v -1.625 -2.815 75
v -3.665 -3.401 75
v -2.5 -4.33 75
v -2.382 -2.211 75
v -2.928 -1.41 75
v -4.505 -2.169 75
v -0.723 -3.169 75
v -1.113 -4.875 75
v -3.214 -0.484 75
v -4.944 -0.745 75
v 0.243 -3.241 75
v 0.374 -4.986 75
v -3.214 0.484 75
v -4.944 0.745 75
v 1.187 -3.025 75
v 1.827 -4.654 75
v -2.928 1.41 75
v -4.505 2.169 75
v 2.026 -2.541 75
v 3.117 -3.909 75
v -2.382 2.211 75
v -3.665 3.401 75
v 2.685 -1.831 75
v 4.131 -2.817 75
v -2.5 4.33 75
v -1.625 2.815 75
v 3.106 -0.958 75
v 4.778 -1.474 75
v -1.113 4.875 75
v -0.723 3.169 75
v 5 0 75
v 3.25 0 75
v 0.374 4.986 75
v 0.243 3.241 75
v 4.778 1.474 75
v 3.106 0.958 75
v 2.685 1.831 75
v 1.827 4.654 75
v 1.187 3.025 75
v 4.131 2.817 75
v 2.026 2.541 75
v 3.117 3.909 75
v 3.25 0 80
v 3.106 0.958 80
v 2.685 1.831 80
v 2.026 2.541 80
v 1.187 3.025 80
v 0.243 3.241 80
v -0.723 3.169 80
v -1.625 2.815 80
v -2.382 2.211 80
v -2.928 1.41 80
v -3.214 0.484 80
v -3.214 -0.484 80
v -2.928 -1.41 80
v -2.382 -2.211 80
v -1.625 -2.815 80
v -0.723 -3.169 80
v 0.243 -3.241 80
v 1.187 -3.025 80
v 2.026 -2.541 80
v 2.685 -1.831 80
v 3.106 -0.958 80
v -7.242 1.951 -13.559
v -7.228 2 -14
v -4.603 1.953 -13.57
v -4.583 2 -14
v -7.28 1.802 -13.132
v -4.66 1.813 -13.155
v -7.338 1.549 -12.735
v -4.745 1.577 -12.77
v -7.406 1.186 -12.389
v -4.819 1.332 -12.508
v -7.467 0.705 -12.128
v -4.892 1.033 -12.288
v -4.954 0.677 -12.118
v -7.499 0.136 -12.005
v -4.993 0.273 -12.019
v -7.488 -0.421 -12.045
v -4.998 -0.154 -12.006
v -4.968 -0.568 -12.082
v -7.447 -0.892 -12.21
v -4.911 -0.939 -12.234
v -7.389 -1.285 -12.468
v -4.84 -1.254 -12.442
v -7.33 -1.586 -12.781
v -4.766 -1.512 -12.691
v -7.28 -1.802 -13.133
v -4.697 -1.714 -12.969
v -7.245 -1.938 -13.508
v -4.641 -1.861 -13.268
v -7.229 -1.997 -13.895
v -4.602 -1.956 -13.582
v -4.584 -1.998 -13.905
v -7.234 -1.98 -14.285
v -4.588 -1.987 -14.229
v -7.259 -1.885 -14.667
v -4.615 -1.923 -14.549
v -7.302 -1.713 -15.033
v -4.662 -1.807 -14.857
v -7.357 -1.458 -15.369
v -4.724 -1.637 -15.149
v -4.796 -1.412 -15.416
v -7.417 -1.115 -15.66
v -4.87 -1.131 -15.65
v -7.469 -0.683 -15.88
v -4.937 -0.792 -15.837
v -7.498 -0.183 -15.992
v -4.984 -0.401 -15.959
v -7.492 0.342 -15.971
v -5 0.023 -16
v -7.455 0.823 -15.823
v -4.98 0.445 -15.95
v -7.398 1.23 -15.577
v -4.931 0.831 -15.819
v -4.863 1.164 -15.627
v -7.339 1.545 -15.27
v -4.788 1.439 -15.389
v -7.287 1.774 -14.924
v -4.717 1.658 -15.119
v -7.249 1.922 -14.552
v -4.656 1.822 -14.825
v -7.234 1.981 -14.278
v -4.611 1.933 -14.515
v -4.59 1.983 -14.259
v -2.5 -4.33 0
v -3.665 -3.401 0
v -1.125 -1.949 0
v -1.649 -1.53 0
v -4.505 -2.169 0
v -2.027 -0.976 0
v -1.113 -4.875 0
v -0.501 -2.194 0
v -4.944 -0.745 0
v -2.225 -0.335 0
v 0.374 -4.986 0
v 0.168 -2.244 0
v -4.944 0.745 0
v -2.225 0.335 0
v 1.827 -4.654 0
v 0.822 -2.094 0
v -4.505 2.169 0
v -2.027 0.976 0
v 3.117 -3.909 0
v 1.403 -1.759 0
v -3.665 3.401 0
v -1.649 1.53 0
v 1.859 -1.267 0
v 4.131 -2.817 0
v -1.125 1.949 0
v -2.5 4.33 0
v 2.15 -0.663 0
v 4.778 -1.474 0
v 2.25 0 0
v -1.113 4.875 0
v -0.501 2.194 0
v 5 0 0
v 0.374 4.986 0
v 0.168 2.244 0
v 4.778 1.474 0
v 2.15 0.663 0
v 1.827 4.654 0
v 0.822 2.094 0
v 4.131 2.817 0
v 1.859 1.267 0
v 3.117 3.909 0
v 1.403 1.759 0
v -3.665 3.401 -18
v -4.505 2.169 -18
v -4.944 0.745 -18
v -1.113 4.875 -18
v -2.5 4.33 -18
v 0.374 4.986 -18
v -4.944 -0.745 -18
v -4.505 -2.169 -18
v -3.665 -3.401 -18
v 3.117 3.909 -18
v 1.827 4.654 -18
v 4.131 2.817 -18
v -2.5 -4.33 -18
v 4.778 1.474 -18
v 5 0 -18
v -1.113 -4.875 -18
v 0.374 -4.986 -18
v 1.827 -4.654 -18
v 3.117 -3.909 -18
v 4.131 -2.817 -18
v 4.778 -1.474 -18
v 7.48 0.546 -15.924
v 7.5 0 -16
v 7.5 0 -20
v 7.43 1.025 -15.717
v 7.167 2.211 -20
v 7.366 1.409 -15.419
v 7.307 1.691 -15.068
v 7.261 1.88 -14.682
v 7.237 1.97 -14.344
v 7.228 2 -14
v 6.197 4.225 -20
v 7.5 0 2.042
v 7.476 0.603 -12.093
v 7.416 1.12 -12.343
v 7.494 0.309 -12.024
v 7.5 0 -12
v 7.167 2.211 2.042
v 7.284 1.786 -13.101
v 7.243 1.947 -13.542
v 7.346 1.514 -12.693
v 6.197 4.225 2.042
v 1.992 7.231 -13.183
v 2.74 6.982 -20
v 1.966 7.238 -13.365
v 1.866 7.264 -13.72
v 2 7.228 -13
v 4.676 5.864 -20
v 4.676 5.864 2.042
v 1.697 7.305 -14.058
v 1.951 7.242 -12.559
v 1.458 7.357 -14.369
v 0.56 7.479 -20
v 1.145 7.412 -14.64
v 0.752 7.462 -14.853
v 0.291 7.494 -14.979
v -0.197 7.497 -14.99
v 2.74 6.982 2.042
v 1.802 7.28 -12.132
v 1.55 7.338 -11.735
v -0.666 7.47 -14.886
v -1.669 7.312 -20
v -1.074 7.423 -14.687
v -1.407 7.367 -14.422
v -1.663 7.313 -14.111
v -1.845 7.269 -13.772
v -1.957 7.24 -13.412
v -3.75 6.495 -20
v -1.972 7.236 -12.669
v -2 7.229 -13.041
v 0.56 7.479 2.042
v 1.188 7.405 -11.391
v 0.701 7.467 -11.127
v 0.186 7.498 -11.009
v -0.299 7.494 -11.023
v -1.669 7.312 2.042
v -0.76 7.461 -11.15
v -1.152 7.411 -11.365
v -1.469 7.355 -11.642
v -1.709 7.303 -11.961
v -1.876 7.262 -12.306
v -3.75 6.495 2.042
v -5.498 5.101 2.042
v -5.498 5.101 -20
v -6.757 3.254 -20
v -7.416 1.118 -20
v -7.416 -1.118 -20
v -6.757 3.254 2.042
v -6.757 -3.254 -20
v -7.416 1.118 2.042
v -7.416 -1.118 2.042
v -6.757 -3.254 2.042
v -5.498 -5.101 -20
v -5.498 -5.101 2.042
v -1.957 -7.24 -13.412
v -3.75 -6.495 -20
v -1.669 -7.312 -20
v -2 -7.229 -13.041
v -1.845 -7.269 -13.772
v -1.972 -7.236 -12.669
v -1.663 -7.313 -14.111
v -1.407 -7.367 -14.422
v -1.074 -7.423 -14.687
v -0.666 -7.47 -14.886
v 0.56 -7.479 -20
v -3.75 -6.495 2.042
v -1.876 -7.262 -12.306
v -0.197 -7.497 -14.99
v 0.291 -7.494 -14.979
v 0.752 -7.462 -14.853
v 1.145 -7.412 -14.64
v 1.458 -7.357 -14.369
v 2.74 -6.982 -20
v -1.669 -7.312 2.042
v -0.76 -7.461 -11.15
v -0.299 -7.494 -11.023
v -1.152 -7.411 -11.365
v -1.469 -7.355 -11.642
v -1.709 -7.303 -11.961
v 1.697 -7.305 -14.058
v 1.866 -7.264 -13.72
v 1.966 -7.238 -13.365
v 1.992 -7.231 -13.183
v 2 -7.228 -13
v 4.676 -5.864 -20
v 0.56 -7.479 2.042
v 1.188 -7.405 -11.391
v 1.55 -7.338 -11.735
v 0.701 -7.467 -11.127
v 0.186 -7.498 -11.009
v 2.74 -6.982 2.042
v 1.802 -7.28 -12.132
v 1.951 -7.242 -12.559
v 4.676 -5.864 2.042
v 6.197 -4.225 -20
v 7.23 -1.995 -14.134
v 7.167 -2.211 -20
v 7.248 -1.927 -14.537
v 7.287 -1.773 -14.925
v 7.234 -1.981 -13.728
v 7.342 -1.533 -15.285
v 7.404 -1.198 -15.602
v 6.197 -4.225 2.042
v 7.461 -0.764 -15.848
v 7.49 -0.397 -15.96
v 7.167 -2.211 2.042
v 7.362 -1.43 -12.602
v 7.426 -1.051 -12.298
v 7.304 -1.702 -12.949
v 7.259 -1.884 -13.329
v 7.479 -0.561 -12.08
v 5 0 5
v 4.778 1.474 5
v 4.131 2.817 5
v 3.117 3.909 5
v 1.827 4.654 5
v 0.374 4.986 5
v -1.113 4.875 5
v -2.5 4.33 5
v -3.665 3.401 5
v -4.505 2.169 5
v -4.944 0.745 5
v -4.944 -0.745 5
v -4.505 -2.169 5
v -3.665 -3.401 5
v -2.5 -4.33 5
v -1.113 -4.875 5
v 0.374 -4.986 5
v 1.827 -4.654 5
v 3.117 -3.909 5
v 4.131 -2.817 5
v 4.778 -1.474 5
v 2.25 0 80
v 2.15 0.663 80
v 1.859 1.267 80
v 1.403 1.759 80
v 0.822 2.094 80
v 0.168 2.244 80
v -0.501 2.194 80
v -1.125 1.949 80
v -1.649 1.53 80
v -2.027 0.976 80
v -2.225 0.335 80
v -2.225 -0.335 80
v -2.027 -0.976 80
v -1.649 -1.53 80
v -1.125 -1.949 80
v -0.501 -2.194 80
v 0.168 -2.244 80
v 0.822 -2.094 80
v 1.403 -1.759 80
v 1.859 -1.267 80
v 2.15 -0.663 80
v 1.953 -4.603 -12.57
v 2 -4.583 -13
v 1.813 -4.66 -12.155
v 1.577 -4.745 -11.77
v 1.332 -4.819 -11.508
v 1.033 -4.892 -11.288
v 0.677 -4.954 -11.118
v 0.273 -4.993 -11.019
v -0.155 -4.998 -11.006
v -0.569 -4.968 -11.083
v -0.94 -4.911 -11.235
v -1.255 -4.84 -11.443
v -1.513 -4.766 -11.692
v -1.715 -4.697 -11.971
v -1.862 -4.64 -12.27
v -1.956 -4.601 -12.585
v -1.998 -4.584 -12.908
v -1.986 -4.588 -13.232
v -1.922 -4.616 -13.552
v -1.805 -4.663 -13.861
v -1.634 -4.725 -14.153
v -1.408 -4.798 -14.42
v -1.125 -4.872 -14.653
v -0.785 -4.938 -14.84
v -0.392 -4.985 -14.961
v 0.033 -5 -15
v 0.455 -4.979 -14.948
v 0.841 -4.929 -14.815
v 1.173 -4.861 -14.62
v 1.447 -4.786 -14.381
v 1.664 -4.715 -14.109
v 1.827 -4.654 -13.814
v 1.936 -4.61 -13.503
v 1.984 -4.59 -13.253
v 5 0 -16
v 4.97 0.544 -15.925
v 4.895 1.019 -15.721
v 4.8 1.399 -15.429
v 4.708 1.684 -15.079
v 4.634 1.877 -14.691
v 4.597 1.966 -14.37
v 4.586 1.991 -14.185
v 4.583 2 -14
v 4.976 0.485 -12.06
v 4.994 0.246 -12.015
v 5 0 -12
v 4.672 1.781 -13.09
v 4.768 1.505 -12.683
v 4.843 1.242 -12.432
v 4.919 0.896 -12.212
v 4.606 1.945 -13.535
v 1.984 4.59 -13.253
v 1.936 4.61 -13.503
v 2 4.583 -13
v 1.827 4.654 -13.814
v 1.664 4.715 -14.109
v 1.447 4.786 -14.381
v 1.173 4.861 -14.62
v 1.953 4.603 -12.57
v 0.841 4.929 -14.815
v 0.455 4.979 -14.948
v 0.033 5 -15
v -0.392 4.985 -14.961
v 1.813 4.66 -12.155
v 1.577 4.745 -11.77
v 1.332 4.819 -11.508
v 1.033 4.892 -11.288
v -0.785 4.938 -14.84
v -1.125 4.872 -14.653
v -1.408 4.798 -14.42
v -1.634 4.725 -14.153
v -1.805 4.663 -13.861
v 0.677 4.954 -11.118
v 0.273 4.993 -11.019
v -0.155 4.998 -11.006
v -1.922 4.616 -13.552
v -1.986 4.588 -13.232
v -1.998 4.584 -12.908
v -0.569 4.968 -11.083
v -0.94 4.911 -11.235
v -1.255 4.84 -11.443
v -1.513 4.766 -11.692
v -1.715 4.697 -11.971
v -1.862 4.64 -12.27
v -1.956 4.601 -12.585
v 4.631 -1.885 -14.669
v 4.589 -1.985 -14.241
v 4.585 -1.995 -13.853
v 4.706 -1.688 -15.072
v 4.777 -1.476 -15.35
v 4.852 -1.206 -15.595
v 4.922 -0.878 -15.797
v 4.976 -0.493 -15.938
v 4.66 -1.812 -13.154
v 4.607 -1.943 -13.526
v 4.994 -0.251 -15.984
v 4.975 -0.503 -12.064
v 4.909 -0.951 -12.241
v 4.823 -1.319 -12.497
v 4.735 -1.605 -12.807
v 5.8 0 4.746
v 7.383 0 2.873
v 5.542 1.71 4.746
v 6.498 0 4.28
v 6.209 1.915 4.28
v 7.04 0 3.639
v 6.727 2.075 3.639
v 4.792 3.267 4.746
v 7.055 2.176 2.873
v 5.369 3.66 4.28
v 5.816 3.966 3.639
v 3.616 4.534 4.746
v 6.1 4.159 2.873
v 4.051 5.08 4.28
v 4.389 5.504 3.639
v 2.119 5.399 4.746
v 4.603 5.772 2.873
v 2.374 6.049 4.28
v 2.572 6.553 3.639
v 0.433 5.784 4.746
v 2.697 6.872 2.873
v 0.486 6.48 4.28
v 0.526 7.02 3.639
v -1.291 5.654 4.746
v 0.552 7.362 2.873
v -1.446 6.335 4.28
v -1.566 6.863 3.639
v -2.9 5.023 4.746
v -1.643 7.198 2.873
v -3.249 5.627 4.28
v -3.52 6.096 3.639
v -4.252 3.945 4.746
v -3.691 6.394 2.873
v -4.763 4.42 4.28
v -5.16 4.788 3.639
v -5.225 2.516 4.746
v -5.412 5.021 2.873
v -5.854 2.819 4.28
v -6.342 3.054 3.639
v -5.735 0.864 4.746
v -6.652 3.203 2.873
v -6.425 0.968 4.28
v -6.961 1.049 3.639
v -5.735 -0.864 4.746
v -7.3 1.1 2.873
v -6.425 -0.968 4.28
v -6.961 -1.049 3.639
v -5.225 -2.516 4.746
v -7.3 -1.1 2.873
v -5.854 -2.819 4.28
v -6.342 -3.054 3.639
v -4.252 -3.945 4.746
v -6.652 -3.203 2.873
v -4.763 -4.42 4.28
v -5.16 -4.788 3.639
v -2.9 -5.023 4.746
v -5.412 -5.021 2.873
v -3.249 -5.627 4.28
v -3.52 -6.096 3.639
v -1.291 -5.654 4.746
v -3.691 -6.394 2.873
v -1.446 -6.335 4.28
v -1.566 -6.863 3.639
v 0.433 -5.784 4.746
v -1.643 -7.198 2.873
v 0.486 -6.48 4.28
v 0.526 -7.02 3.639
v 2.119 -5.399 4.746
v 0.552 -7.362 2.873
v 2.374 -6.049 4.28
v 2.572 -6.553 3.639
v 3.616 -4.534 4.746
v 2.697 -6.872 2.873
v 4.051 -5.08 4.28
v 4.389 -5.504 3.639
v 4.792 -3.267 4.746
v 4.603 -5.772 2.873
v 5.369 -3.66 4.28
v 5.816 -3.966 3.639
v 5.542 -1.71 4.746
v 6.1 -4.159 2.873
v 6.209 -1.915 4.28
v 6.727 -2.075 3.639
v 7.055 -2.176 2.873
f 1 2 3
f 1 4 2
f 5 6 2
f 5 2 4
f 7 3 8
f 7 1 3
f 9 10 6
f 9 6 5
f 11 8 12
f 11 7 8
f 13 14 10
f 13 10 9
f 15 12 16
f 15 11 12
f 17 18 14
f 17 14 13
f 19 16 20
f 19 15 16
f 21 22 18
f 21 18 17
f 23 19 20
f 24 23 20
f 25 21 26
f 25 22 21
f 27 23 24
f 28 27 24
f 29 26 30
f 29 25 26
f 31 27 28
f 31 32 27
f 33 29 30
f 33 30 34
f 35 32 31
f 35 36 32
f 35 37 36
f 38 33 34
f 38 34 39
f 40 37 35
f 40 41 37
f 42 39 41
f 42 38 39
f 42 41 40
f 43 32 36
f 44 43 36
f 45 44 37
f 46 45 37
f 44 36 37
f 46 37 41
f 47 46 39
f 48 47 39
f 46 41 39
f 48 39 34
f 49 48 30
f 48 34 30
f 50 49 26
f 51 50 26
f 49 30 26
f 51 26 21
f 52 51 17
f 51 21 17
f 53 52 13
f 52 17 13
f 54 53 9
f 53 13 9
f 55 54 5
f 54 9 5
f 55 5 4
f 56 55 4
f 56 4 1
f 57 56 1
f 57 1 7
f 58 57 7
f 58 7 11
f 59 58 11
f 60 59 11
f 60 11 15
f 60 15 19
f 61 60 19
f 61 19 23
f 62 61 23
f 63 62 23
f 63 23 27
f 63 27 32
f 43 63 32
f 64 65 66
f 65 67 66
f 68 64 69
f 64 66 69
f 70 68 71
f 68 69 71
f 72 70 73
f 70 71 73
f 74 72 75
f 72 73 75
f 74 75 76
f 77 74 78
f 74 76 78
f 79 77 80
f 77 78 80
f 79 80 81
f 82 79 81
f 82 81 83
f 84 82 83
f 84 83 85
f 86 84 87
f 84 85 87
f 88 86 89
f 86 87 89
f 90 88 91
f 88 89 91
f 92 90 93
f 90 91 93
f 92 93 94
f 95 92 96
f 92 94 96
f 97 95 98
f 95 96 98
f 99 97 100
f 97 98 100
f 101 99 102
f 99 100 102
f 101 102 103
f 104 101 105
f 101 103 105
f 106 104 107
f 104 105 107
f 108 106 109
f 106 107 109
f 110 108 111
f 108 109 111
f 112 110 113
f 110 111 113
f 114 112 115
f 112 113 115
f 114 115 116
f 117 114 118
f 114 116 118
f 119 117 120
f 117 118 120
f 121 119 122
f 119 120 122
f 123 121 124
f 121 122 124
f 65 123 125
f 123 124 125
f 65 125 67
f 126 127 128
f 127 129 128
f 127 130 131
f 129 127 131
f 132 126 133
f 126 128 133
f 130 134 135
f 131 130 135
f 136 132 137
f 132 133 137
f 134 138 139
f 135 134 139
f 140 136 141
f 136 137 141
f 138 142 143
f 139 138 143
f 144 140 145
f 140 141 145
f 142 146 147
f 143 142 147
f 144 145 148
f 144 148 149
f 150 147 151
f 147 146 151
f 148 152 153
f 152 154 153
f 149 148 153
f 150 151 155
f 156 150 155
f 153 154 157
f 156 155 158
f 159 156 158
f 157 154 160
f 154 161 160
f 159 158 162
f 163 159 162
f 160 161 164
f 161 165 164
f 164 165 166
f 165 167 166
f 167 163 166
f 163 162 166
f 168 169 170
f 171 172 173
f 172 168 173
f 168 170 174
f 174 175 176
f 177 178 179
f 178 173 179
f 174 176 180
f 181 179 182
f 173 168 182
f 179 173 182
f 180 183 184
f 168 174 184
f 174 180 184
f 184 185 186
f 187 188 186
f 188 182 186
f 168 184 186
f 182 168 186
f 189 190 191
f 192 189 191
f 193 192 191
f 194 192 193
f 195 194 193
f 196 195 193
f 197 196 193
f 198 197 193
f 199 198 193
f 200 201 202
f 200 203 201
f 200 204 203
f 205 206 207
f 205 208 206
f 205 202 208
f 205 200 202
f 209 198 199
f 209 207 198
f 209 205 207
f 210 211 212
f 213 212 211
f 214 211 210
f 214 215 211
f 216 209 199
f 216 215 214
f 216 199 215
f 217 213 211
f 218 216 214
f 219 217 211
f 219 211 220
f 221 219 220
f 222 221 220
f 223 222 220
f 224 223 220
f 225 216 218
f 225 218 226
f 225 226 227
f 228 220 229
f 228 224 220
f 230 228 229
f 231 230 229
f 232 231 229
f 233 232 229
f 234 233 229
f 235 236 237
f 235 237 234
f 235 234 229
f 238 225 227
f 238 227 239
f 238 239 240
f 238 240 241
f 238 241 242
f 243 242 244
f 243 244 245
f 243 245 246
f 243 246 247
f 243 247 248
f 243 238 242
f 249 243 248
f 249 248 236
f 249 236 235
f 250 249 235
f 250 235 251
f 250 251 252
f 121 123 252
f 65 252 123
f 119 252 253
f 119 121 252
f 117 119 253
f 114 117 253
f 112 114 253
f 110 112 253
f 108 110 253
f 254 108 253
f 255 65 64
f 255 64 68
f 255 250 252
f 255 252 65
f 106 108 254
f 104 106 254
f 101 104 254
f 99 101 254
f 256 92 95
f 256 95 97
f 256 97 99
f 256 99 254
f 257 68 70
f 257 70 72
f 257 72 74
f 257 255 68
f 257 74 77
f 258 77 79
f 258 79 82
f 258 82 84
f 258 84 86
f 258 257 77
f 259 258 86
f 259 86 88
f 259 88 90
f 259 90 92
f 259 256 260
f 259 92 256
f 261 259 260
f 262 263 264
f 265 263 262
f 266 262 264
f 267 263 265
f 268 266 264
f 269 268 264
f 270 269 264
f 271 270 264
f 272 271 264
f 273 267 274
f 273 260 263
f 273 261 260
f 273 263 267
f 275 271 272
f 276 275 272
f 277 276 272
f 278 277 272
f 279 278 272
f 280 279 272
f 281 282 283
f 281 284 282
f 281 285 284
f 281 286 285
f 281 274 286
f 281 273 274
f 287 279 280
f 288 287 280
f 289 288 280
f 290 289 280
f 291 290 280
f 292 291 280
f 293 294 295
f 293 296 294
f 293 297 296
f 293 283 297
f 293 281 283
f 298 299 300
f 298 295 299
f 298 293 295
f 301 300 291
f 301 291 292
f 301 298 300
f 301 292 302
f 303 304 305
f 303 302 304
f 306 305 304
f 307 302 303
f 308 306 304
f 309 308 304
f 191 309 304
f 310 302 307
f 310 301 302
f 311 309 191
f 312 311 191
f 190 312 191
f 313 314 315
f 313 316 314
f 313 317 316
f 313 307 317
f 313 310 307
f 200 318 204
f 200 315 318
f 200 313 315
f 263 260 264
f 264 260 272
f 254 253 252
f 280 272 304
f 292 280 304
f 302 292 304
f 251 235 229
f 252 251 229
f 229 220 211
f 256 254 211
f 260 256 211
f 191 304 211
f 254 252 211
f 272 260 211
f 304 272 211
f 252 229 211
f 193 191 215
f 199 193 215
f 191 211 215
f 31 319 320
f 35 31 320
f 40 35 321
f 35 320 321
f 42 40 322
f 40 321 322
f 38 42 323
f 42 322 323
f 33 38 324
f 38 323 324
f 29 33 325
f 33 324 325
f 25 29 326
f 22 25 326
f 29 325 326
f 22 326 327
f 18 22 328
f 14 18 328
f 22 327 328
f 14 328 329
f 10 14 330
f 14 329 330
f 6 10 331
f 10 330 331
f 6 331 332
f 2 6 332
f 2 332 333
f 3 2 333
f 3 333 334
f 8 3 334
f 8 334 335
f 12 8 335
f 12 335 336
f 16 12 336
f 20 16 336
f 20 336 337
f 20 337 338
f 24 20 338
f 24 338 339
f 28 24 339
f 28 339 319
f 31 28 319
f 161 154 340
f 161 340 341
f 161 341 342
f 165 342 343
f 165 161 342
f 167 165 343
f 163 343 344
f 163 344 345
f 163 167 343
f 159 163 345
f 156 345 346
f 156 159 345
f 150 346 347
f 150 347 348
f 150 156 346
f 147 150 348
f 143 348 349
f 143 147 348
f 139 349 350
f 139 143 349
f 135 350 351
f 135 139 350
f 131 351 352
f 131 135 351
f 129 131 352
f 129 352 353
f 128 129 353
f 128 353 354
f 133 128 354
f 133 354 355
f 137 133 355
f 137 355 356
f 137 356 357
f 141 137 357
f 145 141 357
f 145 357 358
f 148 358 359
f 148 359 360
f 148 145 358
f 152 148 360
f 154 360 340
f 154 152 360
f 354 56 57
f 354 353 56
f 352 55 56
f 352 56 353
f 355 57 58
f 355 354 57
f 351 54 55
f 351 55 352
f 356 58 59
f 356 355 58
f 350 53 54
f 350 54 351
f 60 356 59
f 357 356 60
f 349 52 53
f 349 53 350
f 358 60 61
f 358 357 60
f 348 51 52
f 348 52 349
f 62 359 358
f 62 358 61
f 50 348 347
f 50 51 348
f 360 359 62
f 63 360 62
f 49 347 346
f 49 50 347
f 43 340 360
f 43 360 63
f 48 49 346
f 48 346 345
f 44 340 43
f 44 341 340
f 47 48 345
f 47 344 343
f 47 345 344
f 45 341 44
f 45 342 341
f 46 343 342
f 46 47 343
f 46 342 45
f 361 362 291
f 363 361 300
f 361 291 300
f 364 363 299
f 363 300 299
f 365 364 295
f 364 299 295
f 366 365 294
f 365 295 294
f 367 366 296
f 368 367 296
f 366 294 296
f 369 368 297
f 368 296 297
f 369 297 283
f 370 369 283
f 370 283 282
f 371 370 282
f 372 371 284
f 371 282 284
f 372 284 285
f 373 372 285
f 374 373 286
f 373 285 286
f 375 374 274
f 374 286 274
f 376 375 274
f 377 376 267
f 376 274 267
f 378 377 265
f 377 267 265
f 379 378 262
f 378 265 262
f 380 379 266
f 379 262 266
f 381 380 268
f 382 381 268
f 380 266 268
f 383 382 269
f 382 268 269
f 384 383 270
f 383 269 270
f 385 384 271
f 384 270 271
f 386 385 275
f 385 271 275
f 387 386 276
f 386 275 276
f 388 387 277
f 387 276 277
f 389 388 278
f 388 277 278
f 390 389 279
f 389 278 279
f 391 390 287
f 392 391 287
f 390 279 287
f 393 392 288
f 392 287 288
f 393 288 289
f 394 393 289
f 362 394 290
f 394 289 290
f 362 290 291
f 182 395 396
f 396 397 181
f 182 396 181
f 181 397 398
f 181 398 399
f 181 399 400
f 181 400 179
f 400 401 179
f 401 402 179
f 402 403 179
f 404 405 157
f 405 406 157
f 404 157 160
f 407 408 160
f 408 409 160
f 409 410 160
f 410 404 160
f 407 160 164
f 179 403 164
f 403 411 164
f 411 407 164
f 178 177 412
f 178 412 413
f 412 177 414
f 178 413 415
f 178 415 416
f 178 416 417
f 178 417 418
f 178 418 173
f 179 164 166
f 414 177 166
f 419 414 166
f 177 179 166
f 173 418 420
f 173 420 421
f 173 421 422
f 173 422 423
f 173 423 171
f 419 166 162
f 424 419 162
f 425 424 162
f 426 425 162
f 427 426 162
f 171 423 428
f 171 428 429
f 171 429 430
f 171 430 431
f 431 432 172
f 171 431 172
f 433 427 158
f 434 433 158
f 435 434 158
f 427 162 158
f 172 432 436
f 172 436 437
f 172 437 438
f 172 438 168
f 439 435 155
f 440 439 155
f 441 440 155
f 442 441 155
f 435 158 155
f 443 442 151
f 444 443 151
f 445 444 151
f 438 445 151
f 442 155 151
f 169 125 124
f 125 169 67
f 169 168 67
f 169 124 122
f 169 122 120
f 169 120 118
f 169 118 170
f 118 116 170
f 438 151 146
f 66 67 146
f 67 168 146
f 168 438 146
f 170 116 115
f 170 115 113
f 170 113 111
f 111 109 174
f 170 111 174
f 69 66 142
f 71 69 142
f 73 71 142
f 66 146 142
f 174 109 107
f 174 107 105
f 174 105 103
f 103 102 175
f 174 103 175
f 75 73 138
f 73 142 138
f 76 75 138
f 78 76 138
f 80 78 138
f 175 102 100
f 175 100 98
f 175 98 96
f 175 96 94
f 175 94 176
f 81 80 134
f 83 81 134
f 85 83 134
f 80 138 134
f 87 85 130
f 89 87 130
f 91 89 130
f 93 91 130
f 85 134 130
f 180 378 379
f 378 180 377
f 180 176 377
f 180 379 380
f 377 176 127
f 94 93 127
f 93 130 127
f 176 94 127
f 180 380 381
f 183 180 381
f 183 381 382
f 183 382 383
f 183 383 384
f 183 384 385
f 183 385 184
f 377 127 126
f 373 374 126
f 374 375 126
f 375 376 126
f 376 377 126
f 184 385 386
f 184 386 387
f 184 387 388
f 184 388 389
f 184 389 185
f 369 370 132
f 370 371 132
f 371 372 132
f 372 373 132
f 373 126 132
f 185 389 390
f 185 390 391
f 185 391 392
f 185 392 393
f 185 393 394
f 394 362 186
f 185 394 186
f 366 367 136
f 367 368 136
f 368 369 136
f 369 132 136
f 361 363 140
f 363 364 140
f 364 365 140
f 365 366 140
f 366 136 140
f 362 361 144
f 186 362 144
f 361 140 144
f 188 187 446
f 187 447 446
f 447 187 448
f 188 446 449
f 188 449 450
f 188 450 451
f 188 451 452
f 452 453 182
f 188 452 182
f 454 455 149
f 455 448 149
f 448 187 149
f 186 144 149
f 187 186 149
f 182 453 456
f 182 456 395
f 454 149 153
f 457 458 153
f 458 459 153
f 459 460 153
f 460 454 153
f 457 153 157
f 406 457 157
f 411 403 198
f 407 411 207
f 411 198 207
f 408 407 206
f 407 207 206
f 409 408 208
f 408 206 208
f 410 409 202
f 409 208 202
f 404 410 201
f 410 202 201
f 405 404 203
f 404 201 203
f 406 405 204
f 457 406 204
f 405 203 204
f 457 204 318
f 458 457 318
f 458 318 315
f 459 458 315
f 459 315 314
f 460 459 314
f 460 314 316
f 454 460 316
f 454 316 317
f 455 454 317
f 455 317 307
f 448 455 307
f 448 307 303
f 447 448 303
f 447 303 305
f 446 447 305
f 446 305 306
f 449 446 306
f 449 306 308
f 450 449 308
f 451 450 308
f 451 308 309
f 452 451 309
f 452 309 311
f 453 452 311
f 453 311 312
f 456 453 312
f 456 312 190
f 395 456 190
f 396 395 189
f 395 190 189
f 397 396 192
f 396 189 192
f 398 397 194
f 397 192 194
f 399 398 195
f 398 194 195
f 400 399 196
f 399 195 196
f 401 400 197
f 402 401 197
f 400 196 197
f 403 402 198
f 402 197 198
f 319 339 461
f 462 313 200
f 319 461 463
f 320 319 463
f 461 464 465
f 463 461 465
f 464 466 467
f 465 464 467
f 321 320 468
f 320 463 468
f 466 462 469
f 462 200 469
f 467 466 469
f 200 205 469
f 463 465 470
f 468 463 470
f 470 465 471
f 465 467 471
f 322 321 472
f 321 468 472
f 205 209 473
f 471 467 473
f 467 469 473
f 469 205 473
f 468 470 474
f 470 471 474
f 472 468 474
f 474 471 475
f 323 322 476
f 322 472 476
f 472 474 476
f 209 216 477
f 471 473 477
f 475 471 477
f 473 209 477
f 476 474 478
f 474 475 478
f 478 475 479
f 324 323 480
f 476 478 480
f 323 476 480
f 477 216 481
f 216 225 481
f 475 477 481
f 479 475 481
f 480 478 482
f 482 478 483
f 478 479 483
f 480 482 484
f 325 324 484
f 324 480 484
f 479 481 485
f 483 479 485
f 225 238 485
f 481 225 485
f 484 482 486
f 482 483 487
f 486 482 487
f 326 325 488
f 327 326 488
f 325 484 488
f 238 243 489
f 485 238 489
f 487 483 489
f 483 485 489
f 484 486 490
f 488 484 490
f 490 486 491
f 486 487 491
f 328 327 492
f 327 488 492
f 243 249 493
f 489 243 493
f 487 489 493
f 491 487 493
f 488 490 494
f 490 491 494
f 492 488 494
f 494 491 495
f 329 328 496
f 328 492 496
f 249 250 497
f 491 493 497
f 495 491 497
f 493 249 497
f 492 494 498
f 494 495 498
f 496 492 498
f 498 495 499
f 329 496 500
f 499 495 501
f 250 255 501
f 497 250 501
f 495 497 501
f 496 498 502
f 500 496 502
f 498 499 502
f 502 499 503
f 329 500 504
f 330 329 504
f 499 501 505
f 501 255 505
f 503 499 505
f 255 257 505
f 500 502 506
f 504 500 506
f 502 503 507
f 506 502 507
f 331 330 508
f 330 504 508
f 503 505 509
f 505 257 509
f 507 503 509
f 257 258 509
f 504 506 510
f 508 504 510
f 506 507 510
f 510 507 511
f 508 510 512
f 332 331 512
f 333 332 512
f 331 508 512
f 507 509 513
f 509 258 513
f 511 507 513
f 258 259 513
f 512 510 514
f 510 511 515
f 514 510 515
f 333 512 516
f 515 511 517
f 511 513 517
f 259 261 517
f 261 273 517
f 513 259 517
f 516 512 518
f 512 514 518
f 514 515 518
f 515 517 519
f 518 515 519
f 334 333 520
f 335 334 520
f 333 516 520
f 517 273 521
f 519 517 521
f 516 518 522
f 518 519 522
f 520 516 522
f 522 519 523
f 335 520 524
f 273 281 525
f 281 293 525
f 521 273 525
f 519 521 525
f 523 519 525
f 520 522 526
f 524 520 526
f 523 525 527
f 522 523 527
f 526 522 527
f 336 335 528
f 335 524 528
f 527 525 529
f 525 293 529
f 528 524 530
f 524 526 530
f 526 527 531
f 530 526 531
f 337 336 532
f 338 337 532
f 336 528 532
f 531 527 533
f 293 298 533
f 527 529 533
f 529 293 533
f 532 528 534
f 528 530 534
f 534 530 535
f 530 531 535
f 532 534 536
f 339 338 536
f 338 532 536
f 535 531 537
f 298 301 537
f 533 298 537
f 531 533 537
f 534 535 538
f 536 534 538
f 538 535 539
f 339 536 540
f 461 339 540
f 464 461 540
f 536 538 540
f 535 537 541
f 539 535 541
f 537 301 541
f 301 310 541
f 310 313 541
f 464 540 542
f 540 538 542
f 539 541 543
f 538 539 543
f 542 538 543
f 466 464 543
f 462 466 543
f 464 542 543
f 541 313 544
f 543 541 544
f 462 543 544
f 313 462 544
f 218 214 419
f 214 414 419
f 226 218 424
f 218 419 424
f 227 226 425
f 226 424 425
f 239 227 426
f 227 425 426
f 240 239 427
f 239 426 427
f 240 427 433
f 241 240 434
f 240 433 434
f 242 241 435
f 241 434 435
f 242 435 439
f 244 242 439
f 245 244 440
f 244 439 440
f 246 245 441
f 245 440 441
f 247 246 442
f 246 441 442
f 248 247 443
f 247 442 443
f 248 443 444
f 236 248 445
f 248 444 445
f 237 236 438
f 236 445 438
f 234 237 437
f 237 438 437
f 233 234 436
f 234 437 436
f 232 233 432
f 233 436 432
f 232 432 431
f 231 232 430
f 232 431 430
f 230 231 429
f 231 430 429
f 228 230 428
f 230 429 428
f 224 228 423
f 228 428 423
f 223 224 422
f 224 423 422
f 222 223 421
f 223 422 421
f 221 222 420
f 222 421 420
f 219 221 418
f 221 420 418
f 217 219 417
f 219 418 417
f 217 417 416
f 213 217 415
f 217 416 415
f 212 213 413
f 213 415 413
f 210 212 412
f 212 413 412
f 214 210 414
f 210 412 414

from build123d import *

# Parameters (mm, degrees)
F0_R      = 3.25
F0_R_2    = 2.25
F1_DEPTH  = 80
F0_R_3    = 5
F2_DEPTH  = 75
F0_R_4    = 7.5
F3_DEPTH  = 5
F4_DEPTH  = 20
F6_R      = 5.5
F7_DEPTH  = 2
F8_R      = 2
F9_DEPTH  = 12.5
F10_R     = 2
F11_DEPTH = 12.5


# Not quite as in the source:
# - a fillet or chamfer that OpenCascade refuses, or shapes differently, is made with other operations: its cross-section is extruded or revolved along the edge and cut away or added


with BuildPart() as f1:
    # F0 (on Top) → F1 (new body)
    with BuildSketch(Plane.XY):
        Circle(F0_R)
        Circle(F0_R_2, mode=Mode.SUBTRACT)
    extrude(amount=F1_DEPTH)

    # F0 (on Top) → F2 (join)
    with BuildSketch(Plane.XY):
        Circle(F0_R_3)
        Circle(F0_R, mode=Mode.SUBTRACT)
    extrude(amount=F2_DEPTH)

    # F0 (on Top) → F3 (join)
    with BuildSketch(Plane.XY):
        Circle(F0_R_4)
        Circle(F0_R_3, mode=Mode.SUBTRACT)
    extrude(amount=F3_DEPTH)

    # F0 (on Top) → F4 (join)
    with BuildSketch(Plane.XY):
        Circle(F0_R_4)
        Circle(F0_R_3, mode=Mode.SUBTRACT)
    extrude(amount=-F4_DEPTH)

    # F6 (on offset) → F7 (join)
    with BuildSketch(Plane(origin=(0, 0, -20), x_dir=(1, 0, 0), z_dir=(0, 0, -1))):
        Circle(F6_R)
    extrude(amount=-F7_DEPTH)

    # F8 (on Front) → F9 (cut, symmetric)
    with BuildSketch(Plane.XZ):
        with Locations((0, -13)):
            Circle(F8_R)
    extrude(amount=F9_DEPTH, both=True, mode=Mode.SUBTRACT)

    # F10 (on Right) → F11 (cut, symmetric)
    with BuildSketch(Plane.YZ):
        with Locations((0, -14)):
            Circle(F10_R)
    extrude(amount=F11_DEPTH, both=True, mode=Mode.SUBTRACT)

    # F12: fillet of radius 3 on 1 edges, made by hand

    # F12_s1 → F12_t2 (revolve, cut)
    with BuildSketch(Plane.XZ):
        with BuildLine():
            ThreePointArc((5, 5), (6.7912878475, 3.9784517816), (7.5, 2.0419601084))
            Line((7.5, 2.0419601084), (7.5, 5))
            Line((7.5, 5), (5, 5))
        make_face()
    revolve(axis=Axis((0, 0, 5), (0, 0, 1)), mode=Mode.SUBTRACT)


solid = f1.part
